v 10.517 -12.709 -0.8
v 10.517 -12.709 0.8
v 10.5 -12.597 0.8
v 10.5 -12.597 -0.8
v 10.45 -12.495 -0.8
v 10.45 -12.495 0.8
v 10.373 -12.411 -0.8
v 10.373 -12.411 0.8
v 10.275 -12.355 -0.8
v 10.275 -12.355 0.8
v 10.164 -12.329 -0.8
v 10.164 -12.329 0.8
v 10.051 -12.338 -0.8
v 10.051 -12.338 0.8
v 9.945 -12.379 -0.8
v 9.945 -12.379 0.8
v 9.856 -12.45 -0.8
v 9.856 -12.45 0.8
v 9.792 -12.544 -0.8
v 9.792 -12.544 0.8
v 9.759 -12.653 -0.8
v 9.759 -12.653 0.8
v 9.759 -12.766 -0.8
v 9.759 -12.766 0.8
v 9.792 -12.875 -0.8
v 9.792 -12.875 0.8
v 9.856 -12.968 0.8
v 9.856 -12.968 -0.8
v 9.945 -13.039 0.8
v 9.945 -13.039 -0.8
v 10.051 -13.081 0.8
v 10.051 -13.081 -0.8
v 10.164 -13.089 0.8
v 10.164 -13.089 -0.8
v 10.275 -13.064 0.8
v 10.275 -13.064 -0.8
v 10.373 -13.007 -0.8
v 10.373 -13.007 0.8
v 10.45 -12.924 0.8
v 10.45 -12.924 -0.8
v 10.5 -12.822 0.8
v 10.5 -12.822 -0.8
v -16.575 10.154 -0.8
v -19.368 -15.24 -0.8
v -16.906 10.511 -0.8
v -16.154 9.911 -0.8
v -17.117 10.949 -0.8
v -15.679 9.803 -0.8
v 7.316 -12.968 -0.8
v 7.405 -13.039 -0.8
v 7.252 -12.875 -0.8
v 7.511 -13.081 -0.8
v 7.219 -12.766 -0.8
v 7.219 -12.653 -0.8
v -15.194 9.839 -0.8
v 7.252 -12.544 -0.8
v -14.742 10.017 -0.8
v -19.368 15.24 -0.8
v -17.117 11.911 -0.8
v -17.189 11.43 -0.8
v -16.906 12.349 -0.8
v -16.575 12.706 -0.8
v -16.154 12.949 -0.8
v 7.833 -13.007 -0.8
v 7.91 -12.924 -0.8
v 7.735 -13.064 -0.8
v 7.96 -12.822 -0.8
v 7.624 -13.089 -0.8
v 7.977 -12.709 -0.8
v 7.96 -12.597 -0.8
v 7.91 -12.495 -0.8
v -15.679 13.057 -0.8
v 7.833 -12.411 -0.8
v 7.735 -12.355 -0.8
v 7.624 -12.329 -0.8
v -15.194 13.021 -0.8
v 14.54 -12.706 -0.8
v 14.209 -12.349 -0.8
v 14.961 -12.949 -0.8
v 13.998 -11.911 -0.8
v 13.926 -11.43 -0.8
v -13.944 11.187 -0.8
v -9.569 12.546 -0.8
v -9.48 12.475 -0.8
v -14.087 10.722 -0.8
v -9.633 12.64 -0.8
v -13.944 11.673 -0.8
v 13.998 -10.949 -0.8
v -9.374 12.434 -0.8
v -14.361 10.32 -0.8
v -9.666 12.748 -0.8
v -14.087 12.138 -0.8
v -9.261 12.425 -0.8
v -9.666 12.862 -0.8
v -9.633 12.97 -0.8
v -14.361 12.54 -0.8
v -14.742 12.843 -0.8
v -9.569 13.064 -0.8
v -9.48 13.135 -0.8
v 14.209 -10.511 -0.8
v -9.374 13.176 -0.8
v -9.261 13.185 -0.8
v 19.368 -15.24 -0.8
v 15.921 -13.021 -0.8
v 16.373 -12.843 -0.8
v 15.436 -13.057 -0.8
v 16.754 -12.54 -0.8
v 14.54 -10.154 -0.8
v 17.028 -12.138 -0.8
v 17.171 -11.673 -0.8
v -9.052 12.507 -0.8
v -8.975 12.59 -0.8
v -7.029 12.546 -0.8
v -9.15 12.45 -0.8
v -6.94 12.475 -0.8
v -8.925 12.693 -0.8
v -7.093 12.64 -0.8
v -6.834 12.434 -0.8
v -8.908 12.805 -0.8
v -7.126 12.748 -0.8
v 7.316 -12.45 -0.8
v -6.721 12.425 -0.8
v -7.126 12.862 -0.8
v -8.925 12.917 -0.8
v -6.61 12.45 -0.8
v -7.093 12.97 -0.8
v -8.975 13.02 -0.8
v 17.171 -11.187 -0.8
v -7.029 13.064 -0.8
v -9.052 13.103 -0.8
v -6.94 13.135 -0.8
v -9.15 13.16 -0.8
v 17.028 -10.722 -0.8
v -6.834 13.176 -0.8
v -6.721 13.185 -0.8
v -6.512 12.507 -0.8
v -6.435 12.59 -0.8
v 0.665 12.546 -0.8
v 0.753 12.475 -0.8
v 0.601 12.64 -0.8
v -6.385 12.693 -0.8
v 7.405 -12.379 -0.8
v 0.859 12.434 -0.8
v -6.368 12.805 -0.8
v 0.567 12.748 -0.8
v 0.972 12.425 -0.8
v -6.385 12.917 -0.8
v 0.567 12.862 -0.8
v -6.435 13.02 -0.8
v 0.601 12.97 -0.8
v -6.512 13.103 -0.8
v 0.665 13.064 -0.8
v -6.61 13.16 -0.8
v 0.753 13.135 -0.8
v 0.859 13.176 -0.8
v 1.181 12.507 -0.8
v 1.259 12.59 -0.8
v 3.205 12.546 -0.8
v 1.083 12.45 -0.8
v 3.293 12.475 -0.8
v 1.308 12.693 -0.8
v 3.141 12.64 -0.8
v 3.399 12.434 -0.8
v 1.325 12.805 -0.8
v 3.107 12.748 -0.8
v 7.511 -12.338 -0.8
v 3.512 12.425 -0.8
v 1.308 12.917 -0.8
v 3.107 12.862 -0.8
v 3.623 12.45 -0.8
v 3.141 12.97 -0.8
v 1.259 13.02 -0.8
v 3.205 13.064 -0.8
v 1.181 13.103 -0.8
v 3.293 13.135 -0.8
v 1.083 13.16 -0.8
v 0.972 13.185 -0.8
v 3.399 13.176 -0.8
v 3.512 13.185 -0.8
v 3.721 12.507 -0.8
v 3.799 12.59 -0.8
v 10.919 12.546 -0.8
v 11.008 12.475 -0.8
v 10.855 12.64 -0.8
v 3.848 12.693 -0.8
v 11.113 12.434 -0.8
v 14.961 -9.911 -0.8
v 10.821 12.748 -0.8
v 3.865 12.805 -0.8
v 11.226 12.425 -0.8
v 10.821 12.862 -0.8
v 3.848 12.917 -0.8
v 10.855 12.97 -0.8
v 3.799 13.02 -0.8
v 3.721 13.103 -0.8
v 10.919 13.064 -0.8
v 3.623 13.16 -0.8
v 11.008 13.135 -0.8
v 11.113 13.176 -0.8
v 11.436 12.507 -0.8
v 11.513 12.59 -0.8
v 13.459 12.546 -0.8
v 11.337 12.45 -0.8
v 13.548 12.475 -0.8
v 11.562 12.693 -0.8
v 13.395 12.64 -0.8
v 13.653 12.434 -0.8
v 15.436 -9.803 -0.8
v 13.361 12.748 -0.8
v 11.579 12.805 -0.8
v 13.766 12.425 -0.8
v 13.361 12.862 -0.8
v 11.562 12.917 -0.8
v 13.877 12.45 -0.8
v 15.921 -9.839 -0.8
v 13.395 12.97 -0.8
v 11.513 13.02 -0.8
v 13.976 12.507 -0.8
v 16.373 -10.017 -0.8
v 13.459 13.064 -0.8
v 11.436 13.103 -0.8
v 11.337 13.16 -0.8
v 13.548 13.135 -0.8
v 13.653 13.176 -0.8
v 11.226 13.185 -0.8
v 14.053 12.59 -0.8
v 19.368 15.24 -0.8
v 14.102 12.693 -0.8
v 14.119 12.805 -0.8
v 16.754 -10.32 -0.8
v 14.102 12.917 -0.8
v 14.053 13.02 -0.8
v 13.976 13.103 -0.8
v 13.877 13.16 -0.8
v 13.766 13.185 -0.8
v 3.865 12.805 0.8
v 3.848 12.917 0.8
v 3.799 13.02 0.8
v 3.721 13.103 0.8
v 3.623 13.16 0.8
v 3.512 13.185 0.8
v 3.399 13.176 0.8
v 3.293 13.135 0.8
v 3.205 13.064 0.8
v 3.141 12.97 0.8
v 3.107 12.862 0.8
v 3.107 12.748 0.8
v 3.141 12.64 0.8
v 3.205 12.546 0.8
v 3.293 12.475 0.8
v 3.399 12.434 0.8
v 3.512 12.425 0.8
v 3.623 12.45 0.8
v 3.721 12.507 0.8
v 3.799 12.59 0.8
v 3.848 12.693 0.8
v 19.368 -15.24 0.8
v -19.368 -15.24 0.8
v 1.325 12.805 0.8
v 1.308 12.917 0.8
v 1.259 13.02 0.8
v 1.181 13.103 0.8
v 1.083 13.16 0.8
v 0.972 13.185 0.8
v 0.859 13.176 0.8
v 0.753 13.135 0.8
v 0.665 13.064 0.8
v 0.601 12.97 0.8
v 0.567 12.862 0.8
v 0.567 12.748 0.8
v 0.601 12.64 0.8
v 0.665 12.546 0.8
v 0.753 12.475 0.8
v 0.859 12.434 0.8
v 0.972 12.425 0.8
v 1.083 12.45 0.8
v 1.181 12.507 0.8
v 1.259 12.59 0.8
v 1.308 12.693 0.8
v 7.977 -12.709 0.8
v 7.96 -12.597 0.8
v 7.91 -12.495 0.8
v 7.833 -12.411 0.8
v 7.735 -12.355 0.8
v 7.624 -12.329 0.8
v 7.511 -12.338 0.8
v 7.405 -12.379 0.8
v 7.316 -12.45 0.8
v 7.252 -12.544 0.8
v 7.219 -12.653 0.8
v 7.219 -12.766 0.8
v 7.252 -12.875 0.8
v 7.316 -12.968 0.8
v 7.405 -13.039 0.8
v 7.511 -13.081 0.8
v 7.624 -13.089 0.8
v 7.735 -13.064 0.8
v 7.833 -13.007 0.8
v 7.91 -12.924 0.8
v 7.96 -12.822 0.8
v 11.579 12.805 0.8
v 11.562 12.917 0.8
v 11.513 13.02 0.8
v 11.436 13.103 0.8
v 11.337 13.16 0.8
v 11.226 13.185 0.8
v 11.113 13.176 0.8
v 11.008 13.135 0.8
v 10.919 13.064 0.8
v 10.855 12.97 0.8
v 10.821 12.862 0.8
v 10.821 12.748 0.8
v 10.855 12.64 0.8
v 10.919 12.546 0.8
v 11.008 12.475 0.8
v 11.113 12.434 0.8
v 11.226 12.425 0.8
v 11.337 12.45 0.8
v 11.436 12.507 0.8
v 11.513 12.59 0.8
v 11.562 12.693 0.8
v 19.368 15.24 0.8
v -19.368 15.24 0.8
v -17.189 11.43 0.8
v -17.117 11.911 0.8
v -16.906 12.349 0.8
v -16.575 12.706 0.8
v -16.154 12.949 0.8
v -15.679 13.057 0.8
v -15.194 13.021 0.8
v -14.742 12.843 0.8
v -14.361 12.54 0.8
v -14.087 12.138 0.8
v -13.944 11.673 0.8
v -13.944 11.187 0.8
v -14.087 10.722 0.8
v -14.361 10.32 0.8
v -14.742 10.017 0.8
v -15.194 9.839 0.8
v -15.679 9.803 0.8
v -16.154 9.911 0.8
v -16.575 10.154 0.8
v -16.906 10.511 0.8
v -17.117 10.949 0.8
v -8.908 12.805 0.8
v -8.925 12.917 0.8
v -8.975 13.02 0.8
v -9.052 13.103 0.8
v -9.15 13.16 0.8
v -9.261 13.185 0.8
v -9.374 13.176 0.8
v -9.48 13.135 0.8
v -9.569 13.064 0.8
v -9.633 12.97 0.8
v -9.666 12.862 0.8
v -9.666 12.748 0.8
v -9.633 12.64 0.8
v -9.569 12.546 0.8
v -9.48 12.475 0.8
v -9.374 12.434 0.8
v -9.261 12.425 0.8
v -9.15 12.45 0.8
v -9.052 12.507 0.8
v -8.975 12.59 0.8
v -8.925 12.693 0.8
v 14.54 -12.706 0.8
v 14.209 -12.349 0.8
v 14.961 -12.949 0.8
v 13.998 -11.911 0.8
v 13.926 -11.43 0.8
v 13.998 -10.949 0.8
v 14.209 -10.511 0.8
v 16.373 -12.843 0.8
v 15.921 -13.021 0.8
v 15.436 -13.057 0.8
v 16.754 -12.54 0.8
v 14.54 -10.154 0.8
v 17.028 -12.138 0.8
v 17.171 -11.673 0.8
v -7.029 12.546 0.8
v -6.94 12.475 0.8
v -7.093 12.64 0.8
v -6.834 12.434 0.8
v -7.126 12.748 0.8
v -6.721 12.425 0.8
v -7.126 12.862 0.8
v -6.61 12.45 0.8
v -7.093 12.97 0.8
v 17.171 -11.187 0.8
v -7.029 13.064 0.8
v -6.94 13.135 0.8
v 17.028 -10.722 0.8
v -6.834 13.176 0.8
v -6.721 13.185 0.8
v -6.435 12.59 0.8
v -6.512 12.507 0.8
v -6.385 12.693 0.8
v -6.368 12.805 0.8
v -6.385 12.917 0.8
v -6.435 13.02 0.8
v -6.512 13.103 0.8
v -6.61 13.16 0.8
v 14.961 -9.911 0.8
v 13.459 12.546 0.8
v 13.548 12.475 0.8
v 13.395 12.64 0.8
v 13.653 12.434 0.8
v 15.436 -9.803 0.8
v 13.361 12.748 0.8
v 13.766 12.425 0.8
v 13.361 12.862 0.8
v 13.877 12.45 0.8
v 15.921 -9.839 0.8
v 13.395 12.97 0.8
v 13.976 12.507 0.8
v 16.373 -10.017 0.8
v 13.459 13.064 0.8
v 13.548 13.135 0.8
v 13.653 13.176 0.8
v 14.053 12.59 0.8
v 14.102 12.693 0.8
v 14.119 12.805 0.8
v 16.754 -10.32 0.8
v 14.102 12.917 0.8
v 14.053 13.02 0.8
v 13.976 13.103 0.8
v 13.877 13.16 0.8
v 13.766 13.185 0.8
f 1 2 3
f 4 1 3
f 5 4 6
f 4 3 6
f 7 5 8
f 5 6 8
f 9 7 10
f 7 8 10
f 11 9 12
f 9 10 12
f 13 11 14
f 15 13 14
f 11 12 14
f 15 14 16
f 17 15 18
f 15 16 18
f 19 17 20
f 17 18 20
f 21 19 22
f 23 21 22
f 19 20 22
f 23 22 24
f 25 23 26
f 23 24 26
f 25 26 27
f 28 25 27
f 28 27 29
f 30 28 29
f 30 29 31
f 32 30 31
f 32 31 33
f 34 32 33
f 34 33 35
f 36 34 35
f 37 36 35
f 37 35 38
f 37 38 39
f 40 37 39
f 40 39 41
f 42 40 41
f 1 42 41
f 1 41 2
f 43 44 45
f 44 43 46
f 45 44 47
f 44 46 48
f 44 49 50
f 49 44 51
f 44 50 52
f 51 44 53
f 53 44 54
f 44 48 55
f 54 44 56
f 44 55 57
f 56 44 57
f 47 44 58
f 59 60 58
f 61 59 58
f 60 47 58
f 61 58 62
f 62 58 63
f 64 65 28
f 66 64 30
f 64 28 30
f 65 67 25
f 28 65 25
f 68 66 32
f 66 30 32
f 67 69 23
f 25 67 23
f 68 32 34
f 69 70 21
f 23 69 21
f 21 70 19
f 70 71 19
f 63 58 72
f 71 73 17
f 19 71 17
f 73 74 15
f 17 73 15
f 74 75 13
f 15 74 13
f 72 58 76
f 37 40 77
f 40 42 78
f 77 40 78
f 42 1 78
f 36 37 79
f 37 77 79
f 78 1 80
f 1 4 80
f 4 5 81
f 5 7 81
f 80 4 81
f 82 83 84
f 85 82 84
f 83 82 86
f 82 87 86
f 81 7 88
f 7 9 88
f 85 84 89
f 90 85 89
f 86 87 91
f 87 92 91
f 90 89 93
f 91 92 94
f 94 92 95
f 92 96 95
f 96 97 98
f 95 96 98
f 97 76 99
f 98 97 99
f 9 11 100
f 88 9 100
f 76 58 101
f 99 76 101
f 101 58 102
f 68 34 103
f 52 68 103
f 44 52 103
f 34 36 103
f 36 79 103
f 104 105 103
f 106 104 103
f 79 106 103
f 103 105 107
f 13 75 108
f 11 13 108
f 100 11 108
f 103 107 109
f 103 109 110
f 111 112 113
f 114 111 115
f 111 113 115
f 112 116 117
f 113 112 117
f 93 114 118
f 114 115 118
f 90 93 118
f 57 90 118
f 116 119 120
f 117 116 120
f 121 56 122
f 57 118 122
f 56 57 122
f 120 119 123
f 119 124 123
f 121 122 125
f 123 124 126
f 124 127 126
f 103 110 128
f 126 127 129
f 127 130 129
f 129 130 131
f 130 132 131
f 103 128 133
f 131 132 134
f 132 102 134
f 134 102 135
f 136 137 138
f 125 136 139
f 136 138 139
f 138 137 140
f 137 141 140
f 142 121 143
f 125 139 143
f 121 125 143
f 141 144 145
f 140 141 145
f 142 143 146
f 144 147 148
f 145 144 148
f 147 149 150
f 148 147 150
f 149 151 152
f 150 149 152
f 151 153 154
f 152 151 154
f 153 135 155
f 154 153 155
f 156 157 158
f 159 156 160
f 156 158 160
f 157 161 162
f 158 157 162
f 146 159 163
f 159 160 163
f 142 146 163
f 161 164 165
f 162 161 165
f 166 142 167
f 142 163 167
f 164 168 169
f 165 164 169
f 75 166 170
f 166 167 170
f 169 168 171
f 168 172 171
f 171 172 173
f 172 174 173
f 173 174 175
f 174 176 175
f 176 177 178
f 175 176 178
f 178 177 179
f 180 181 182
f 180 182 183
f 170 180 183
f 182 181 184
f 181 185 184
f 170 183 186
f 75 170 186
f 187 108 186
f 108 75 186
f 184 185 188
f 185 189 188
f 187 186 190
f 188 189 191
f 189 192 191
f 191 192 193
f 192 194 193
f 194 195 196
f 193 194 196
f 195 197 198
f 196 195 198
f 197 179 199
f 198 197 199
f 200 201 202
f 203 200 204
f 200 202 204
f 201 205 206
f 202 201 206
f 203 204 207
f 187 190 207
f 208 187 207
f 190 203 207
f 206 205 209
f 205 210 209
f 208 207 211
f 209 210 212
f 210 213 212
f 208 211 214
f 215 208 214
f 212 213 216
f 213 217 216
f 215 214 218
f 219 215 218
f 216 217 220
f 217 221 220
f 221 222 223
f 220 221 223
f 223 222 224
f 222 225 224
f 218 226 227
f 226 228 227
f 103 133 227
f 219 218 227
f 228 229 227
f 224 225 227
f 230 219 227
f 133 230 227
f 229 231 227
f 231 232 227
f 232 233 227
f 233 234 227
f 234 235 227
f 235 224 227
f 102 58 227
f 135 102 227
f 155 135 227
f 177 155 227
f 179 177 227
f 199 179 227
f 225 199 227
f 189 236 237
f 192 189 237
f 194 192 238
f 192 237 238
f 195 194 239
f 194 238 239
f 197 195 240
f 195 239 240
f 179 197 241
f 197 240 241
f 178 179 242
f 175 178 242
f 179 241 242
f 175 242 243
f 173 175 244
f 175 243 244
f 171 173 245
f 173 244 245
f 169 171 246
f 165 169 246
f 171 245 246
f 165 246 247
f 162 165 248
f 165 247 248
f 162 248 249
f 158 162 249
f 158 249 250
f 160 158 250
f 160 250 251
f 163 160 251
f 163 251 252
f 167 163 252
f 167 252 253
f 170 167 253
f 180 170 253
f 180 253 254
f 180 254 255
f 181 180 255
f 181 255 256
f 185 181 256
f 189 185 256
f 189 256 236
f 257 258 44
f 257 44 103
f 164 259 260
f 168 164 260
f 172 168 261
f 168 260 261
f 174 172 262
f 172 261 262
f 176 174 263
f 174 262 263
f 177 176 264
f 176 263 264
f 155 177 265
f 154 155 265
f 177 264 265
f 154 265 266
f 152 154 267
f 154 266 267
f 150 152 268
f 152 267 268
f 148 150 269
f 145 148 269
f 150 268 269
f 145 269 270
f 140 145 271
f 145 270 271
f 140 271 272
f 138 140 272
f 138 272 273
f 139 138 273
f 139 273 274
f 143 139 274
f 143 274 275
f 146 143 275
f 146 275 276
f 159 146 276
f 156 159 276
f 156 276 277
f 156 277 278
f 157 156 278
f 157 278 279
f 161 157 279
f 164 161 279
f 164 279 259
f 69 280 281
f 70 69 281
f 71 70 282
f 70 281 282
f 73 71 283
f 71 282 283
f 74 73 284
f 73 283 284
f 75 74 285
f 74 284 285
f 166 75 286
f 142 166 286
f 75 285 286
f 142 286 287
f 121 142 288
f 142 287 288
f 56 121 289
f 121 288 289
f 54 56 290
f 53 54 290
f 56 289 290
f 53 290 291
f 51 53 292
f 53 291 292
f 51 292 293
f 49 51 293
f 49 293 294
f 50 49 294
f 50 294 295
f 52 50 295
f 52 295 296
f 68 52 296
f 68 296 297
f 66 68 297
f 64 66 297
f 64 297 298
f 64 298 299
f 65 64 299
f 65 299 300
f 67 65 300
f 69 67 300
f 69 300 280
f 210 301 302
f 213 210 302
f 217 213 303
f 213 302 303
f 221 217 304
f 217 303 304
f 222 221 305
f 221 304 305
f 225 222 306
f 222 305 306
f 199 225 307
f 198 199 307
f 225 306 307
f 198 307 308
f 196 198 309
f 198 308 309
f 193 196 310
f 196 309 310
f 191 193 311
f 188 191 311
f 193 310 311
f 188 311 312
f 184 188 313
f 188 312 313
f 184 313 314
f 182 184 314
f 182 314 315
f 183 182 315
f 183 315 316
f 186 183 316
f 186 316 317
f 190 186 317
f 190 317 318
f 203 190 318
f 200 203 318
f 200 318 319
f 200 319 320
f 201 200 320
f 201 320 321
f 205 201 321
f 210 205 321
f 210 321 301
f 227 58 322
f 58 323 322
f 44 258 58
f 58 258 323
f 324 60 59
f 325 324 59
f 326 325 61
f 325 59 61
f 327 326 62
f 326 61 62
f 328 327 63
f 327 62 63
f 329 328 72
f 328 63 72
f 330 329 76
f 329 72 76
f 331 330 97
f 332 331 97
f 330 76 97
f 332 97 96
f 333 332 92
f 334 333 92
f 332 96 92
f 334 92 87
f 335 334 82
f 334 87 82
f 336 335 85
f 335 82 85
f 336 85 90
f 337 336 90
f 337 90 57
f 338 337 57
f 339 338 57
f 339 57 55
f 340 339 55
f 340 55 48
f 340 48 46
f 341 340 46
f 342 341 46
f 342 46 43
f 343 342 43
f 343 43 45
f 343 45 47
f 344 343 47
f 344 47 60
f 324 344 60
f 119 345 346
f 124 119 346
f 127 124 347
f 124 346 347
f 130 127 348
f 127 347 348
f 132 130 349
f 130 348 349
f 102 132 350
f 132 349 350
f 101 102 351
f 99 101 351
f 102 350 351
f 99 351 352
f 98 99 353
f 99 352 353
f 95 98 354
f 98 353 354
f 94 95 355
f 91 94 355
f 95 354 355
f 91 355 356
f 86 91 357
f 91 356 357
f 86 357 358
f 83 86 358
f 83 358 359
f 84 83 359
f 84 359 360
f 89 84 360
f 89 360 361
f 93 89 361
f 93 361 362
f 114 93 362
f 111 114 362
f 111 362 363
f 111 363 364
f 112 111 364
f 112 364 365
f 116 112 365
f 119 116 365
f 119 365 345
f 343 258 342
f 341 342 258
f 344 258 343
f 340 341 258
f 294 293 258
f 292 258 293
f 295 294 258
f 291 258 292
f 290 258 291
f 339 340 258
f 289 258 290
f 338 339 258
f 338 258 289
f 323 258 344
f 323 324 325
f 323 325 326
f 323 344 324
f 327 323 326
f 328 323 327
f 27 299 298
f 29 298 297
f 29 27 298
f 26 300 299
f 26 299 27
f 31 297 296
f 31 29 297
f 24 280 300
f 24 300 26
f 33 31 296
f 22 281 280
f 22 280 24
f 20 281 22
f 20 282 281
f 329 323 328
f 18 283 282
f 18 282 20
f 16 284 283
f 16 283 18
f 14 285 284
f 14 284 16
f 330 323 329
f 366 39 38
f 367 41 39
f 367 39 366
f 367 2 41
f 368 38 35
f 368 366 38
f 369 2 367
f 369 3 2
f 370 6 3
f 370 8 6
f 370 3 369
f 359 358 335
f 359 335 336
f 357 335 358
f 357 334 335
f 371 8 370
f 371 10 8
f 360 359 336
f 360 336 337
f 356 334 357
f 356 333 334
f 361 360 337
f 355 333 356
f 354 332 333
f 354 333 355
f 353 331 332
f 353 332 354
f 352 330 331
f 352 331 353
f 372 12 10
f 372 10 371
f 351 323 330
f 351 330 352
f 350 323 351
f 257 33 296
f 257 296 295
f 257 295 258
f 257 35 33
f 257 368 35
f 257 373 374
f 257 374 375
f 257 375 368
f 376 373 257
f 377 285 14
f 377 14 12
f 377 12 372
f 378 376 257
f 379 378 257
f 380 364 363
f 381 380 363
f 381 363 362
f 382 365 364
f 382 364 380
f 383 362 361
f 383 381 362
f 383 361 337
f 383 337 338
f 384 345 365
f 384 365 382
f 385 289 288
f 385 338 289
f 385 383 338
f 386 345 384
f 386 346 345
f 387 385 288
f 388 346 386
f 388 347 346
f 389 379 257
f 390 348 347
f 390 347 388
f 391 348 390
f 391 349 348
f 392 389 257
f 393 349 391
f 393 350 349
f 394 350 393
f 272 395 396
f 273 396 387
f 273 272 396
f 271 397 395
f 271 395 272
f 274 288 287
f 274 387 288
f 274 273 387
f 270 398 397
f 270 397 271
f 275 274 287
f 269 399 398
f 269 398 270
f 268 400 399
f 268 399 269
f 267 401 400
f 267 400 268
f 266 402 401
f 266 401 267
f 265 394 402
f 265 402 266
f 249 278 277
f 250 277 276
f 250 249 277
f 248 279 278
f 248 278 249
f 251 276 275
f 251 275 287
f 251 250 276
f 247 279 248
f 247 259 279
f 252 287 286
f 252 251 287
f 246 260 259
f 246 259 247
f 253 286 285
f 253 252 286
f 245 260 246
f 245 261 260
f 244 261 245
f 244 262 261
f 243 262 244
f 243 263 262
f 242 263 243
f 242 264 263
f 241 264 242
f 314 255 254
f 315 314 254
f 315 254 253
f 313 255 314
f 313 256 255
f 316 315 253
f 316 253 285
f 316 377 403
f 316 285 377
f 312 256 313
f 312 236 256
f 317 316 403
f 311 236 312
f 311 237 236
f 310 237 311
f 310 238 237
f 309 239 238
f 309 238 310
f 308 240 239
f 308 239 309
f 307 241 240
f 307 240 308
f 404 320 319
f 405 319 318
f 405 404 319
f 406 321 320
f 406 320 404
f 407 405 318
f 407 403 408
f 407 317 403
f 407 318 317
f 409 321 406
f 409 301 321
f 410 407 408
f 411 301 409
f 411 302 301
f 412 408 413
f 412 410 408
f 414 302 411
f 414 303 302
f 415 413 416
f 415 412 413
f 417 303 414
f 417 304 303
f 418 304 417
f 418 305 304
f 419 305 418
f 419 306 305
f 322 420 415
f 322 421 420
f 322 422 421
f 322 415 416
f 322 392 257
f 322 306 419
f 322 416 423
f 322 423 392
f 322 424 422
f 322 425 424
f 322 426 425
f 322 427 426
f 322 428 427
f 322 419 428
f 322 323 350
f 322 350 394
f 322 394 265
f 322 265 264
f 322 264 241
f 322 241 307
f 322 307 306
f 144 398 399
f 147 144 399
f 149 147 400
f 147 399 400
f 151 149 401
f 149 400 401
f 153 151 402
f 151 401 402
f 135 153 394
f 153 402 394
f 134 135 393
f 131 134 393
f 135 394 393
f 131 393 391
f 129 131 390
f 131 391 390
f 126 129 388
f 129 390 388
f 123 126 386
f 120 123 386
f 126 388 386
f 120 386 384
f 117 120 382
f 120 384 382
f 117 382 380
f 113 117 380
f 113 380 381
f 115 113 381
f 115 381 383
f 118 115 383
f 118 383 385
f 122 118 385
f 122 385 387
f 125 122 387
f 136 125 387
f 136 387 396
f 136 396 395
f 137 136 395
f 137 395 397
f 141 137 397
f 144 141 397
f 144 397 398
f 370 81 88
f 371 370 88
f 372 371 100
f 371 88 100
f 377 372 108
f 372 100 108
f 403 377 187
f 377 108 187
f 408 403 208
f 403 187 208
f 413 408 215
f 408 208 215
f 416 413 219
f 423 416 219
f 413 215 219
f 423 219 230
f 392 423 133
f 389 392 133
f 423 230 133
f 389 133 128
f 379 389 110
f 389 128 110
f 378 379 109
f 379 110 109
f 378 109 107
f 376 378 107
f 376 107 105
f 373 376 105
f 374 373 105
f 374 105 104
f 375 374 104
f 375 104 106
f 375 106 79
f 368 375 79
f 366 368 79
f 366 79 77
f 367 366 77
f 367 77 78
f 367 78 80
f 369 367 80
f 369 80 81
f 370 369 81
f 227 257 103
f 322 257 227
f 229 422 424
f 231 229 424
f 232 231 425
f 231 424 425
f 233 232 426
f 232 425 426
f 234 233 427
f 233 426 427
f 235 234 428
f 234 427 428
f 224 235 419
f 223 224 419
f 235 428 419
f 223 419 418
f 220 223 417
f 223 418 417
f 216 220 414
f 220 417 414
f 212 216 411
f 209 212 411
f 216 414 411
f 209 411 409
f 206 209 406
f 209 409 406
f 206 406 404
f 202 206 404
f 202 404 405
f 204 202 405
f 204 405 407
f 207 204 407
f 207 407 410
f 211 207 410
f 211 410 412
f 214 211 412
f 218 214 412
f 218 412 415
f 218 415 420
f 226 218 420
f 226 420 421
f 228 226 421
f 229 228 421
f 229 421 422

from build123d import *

# Parameters (mm, degrees)
SKETCH1_W                 = 38.735
SKETCH1_H                 = 30.48
BOSS_EXTRUDE1_DEPTH       = 0.8
F_4_CLEARANCE_HOLE1_D     = 3.2639
F_4_CLEARANCE_HOLE1_DEPTH = 10.922
F_4_CLEARANCE_HOLE1_TIP   = 0.980574487
SKETCH6_R                 = 0.381
CUT_EXTRUDE1_DEPTH        = 2.6


with BuildPart() as part:
    # Sketch1 → Boss-Extrude1 (new body, symmetric)
    with BuildSketch(Plane.XY):
        Rectangle(SKETCH1_W, SKETCH1_H)
    extrude(amount=BOSS_EXTRUDE1_DEPTH, both=True)

    # #4 Clearance Hole1
    with Locations(Plane.XY.offset(0.8)):
        with Locations((-15.5575, 11.43), (15.5575, -11.43)):
            Hole(F_4_CLEARANCE_HOLE1_D / 2, depth=F_4_CLEARANCE_HOLE1_DEPTH)
            with Locations((0, 0, -(F_4_CLEARANCE_HOLE1_DEPTH + F_4_CLEARANCE_HOLE1_TIP / 2))):  # 118° drill point
                Cone(0, F_4_CLEARANCE_HOLE1_D / 2, F_4_CLEARANCE_HOLE1_TIP, mode=Mode.SUBTRACT)

    # Sketch6 → Cut-Extrude1 (cut, through all)
    with BuildSketch(Plane.XY.offset(0.8)):
        with Locations((-9.289404292, 12.804978229)):
            Circle(SKETCH6_R)
        with Locations((-6.749404292, 12.804978229)):
            Circle(SKETCH6_R)
        with Locations((0.943821165, 12.804978229)):
            Circle(SKETCH6_R)
        with Locations((3.483821165, 12.804978229)):
            Circle(SKETCH6_R)
        with Locations((11.19802304, 12.804978229)):
            Circle(SKETCH6_R)
        with Locations((13.73802304, 12.804978229)):
            Circle(SKETCH6_R)
        with Locations((7.59553263, -12.709329553)):
            Circle(SKETCH6_R)
        with Locations((10.13553263, -12.709329553)):
            Circle(SKETCH6_R)
    extrude(amount=-CUT_EXTRUDE1_DEPTH, mode=Mode.SUBTRACT)


solid = part.part
